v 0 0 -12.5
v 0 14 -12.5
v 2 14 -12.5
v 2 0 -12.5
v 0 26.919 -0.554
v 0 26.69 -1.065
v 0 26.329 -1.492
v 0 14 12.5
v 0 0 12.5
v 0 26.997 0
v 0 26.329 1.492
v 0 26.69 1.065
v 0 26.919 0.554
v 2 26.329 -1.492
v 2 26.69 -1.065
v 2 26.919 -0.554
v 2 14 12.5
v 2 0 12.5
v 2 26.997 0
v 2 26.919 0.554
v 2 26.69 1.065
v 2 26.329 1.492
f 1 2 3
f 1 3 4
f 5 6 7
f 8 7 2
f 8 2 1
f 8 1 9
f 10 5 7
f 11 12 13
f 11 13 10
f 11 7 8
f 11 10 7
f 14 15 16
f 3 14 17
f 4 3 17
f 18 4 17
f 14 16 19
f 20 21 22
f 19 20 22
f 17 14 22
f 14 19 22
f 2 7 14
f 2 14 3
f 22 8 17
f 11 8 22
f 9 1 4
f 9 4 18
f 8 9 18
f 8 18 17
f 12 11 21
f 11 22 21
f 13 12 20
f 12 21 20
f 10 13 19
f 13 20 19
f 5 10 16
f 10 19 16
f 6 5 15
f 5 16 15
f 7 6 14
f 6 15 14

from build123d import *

# Parameters (mm, degrees)
BOSS_EXTRUDE1_DEPTH = 2
FILLET1_R           = 2


with BuildPart() as part:
    # Sketch1 → Boss-Extrude1 (new body)
    with BuildSketch(Plane(origin=(0, 0, 0), x_dir=(0, 0, -1), z_dir=(1, 0, 0))):
        Polygon((12.5, 0), (-12.5, 0), (-12.5, 14), (0, 28), (12.5, 14), align=None)
    extrude(amount=BOSS_EXTRUDE1_DEPTH)

    # Fillet1
    fillet1_edges = [part.edges().sort_by_distance(p)[0] for p in [
        (1, 28, 0),
    ]]
    fillet(fillet1_edges, radius=FILLET1_R)


solid = part.part
